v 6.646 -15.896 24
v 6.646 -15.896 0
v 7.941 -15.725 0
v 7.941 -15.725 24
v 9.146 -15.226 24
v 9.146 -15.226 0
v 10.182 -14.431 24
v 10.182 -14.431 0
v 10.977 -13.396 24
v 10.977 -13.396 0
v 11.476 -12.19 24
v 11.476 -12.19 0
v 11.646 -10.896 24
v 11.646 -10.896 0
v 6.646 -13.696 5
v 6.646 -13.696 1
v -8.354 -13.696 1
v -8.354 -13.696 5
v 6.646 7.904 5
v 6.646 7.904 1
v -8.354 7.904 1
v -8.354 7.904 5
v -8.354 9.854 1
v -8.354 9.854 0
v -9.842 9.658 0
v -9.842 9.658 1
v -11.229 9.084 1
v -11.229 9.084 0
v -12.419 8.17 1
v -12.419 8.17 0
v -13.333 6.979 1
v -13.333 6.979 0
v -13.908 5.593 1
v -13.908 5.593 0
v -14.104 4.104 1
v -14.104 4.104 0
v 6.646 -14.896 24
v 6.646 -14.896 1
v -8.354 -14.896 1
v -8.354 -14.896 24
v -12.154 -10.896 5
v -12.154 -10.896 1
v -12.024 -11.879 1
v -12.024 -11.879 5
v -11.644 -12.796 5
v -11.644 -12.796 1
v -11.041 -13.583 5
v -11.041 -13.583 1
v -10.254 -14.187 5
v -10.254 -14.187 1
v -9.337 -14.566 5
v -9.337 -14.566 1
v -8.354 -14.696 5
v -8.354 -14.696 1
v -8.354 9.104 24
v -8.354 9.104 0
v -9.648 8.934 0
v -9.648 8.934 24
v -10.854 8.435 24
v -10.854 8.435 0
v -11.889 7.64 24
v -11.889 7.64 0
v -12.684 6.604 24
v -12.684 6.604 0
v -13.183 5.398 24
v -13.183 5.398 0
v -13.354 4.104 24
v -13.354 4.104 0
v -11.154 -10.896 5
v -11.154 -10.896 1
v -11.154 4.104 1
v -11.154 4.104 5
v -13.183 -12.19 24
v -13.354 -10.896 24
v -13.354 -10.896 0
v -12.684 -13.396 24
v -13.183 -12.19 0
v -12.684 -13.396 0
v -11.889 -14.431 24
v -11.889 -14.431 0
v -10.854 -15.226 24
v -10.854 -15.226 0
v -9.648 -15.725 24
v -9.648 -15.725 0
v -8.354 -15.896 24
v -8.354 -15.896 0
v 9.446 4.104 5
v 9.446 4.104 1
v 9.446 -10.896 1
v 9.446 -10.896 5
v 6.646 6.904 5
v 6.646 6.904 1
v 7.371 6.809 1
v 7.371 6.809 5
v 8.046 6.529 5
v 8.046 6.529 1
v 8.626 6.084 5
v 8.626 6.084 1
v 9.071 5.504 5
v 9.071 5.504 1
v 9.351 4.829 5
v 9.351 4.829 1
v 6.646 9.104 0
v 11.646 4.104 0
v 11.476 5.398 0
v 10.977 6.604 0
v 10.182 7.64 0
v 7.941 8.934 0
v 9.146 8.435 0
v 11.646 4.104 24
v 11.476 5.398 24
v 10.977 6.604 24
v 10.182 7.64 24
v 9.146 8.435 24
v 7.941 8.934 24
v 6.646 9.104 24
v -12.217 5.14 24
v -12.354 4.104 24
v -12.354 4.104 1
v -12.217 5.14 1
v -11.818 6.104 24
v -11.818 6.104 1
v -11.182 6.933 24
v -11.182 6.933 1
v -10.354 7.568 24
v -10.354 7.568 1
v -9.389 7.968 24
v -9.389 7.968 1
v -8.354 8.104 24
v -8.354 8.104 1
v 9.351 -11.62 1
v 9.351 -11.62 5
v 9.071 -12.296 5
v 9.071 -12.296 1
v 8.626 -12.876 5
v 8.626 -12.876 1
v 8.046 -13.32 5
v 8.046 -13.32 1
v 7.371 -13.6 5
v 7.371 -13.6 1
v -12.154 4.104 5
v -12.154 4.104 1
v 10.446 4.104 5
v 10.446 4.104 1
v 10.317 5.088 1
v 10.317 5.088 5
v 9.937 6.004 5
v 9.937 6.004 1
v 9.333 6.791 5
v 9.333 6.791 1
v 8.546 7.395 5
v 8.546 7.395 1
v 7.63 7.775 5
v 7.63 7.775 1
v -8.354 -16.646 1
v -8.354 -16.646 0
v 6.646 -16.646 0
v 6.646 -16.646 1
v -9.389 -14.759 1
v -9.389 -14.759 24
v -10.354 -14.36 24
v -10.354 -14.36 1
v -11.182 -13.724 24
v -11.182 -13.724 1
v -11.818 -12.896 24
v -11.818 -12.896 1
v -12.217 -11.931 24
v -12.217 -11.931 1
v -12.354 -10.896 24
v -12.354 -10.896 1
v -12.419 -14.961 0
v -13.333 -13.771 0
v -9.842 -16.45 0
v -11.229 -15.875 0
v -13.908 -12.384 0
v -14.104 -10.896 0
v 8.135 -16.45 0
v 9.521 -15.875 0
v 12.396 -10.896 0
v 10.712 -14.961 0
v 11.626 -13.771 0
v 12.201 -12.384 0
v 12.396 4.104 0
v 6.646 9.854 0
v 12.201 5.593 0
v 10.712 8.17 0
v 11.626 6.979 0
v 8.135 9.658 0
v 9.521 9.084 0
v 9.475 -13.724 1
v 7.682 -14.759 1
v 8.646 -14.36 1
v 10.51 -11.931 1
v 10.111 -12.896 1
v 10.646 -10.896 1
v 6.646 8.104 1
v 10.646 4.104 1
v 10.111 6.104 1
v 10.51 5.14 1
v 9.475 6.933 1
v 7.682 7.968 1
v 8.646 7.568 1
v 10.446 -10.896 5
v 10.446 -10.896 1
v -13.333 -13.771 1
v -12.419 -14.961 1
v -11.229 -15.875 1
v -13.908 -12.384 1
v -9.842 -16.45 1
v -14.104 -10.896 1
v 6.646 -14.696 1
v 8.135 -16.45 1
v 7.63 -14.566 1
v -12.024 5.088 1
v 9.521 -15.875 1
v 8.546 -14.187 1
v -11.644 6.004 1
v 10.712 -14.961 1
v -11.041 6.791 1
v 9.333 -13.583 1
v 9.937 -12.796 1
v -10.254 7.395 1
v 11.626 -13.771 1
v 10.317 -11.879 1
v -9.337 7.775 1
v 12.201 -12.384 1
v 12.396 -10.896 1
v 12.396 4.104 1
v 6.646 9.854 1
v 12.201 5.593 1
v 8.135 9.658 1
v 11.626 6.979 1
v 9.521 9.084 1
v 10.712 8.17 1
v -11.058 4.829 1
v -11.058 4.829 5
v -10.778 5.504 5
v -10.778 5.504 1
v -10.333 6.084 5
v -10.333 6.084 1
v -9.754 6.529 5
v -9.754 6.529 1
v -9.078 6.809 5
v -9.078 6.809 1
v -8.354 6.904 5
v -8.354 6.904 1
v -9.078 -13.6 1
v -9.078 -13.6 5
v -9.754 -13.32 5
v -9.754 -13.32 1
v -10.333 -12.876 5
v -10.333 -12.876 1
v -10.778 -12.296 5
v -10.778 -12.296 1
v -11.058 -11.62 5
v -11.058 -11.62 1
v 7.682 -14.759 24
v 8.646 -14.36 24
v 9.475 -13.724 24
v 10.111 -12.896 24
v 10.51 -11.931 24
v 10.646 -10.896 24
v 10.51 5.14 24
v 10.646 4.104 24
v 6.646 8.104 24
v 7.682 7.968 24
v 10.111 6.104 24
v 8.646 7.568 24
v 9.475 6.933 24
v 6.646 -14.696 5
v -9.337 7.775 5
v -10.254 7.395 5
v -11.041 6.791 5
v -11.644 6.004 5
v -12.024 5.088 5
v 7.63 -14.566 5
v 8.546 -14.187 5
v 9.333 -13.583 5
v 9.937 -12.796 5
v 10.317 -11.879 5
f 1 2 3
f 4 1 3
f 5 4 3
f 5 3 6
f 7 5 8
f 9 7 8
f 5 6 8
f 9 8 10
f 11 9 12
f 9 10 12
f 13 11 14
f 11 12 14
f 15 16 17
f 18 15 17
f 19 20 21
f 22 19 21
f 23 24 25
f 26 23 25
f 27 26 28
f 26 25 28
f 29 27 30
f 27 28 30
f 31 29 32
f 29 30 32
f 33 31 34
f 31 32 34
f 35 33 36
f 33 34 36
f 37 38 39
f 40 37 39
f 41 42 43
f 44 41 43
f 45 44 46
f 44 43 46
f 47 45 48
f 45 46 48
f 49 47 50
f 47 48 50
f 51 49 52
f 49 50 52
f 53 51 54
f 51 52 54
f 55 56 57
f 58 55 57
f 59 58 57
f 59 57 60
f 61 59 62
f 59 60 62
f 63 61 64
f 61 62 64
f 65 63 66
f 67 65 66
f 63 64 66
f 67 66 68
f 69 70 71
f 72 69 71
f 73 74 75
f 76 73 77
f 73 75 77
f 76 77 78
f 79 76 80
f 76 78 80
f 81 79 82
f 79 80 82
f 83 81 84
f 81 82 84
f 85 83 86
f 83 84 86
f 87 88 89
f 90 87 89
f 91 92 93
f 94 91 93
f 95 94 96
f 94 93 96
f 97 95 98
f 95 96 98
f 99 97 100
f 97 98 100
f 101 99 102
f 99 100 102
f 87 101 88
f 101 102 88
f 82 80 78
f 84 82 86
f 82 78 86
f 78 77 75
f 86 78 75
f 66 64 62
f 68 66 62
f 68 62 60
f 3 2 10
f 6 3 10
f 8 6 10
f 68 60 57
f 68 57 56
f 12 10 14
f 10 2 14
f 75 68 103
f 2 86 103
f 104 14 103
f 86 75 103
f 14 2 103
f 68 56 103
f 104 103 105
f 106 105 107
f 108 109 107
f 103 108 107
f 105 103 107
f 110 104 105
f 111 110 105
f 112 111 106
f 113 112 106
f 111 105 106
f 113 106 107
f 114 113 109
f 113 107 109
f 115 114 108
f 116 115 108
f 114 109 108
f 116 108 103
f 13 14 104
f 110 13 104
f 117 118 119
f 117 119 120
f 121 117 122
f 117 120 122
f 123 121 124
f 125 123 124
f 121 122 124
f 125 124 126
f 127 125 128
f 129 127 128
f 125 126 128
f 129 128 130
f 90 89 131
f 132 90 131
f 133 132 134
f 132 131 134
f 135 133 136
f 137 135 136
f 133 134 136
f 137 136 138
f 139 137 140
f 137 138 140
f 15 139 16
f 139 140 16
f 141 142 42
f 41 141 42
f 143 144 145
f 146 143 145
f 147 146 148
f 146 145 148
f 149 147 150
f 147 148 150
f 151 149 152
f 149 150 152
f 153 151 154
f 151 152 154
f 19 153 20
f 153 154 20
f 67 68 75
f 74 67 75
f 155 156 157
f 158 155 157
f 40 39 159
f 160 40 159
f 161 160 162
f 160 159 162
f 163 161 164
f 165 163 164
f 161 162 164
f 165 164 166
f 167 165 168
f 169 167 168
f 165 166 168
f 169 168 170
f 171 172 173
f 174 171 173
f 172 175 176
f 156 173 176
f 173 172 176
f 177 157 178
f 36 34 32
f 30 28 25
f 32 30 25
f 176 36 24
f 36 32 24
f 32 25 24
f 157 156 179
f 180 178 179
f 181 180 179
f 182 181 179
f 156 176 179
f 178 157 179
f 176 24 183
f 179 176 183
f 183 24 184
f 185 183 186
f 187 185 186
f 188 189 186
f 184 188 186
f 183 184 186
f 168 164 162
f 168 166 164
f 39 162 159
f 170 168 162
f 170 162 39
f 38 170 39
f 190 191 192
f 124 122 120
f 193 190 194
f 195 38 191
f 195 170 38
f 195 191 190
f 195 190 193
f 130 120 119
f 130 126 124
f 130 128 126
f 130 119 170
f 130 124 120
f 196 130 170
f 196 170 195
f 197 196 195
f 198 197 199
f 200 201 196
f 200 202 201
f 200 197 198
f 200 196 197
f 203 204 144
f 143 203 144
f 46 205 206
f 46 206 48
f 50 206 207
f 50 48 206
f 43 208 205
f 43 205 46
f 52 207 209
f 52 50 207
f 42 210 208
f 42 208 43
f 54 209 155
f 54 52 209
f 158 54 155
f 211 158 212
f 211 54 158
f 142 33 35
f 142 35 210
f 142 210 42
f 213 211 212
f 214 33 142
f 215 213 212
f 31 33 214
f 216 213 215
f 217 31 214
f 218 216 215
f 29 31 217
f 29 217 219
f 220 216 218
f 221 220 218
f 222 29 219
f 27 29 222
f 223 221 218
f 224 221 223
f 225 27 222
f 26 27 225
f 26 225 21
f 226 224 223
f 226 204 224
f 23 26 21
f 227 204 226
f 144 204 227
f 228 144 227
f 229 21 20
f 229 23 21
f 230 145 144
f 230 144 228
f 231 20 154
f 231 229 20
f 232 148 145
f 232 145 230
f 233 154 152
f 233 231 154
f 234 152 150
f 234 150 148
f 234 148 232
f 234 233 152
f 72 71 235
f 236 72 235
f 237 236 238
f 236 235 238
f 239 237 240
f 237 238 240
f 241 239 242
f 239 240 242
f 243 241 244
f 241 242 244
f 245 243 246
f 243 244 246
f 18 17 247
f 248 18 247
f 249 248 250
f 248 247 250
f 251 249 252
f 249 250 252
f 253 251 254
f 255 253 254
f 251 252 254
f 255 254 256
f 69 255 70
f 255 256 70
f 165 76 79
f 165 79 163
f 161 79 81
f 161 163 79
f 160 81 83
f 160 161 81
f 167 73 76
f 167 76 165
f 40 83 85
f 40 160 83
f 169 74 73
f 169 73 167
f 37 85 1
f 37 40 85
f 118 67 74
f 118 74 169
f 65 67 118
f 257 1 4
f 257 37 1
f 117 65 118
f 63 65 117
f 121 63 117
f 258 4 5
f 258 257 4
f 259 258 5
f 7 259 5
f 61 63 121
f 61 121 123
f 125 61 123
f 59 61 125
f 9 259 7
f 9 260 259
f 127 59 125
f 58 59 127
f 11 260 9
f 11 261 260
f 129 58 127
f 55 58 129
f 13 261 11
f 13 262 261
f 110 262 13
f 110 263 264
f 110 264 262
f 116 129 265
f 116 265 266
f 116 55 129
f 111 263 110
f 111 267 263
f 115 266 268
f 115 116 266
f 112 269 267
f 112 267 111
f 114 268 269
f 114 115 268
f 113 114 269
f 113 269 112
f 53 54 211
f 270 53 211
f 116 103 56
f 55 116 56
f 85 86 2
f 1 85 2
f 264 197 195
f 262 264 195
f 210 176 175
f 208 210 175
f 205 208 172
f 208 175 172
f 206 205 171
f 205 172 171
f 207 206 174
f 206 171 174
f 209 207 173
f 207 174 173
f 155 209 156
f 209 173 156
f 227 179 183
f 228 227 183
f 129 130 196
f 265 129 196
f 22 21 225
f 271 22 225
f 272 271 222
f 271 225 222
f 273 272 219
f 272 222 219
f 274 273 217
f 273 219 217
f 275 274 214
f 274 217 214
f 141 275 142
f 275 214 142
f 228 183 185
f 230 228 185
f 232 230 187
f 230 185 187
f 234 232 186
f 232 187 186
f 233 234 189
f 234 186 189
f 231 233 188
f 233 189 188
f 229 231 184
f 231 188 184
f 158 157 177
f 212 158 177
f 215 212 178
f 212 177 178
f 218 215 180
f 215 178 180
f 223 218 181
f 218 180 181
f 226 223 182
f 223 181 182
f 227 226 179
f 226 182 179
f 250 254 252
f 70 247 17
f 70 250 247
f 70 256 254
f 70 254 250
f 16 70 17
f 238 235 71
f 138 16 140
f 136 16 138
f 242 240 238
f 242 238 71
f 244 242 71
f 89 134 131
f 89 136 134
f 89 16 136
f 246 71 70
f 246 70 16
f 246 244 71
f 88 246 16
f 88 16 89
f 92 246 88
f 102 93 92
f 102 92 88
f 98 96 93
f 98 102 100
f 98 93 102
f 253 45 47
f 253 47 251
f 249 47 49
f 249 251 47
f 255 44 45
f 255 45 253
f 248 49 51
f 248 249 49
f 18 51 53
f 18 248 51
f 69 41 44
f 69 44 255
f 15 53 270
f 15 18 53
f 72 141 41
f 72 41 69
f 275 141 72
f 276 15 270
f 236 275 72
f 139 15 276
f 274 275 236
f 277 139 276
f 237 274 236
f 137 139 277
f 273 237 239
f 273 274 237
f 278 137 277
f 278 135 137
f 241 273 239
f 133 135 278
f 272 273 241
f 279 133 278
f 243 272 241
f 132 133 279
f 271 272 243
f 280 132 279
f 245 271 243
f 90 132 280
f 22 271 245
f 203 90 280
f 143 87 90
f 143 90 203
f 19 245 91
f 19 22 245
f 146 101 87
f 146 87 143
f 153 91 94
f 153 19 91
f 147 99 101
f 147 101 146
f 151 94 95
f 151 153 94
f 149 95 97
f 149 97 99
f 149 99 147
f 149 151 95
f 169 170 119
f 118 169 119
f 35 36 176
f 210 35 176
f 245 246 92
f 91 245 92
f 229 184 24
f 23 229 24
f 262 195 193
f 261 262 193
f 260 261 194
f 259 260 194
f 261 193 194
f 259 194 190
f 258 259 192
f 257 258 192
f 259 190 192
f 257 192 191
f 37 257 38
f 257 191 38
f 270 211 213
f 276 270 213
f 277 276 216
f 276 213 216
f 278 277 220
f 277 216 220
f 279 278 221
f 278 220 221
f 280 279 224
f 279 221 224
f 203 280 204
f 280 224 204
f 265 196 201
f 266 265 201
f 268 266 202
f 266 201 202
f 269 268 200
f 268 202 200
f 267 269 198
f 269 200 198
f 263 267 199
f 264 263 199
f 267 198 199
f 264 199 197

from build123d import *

# Parameters (mm, degrees)
F4_DEPTH = 1
F5_DEPTH = 24
F6_DEPTH = 1
F7_DEPTH = 5


with BuildPart() as f4:
    # F3 (on Top) → F4 (new body)
    with BuildSketch(Plane.XY):
        with BuildLine():
            Line((6.6464926861, 9.10439419), (-8.3535073139, 9.10439419))
            ThreePointArc((-8.3535073139, 9.10439419), (-11.8890412198, 7.6399280959), (-13.3535073139, 4.10439419))
            Line((-13.3535073139, 4.10439419), (-13.3535073139, -10.89560581))
            ThreePointArc((-13.3535073139, -10.89560581), (-11.8890412198, -14.4311397159), (-8.3535073139, -15.89560581))
            Line((-8.3535073139, -15.89560581), (6.6464926861, -15.89560581))
            ThreePointArc((6.6464926861, -15.89560581), (10.1820265921, -14.4311397159), (11.6464926861, -10.89560581))
            Line((11.6464926861, -10.89560581), (11.6464926861, 4.10439419))
            ThreePointArc((11.6464926861, 4.10439419), (10.1820265921, 7.6399280959), (6.6464926861, 9.10439419))
        make_face()
        with BuildLine():
            ThreePointArc((-12.3535073139, 4.10439419), (-11.1819344386, 6.9328213148), (-8.3535073139, 8.10439419))
            Line((-8.3535073139, 8.10439419), (6.6464926861, 8.10439419))
            ThreePointArc((6.6464926861, 8.10439419), (9.4749198109, 6.9328213148), (10.6464926861, 4.10439419))
            Line((10.6464926861, 4.10439419), (10.6464926861, -10.89560581))
            ThreePointArc((10.6464926861, -10.89560581), (9.4749198109, -13.7240329347), (6.6464926861, -14.89560581))
            Line((6.6464926861, -14.89560581), (-8.3535073139, -14.89560581))
            ThreePointArc((-8.3535073139, -14.89560581), (-11.1819344386, -13.7240329347), (-12.3535073139, -10.89560581))
            Line((-12.3535073139, -10.89560581), (-12.3535073139, 4.10439419))
        make_face(mode=Mode.SUBTRACT)
        with BuildLine():
            Line((6.6464926861, 8.10439419), (-8.3535073139, 8.10439419))
            ThreePointArc((-8.3535073139, 8.10439419), (-11.1819344386, 6.9328213148), (-12.3535073139, 4.10439419))
            Line((-12.3535073139, 4.10439419), (-12.3535073139, -10.89560581))
            ThreePointArc((-12.3535073139, -10.89560581), (-11.1819344386, -13.7240329347), (-8.3535073139, -14.89560581))
            Line((-8.3535073139, -14.89560581), (6.6464926861, -14.89560581))
            ThreePointArc((6.6464926861, -14.89560581), (9.4749198109, -13.7240329347), (10.6464926861, -10.89560581))
            Line((10.6464926861, -10.89560581), (10.6464926861, 4.10439419))
            ThreePointArc((10.6464926861, 4.10439419), (9.4749198109, 6.9328213148), (6.6464926861, 8.10439419))
        make_face()
        with BuildLine():
            ThreePointArc((-12.1535073139, 4.10439419), (-11.0405130824, 6.7913999585), (-8.3535073139, 7.90439419))
            Line((-8.3535073139, 7.90439419), (6.6464926861, 7.90439419))
            ThreePointArc((6.6464926861, 7.90439419), (9.3334984546, 6.7913999585), (10.4464926861, 4.10439419))
            Line((10.4464926861, 4.10439419), (10.4464926861, -10.89560581))
            ThreePointArc((10.4464926861, -10.89560581), (9.3334984546, -13.5826115785), (6.6464926861, -14.69560581))
            Line((6.6464926861, -14.69560581), (-8.3535073139, -14.69560581))
            ThreePointArc((-8.3535073139, -14.69560581), (-11.0405130824, -13.5826115785), (-12.1535073139, -10.89560581))
            Line((-12.1535073139, -10.89560581), (-12.1535073139, 4.10439419))
        make_face(mode=Mode.SUBTRACT)
        with BuildLine():
            Line((6.6464926861, 7.90439419), (-8.3535073139, 7.90439419))
            ThreePointArc((-8.3535073139, 7.90439419), (-11.0405130824, 6.7913999585), (-12.1535073139, 4.10439419))
            Line((-12.1535073139, 4.10439419), (-12.1535073139, -10.89560581))
            ThreePointArc((-12.1535073139, -10.89560581), (-11.0405130824, -13.5826115785), (-8.3535073139, -14.69560581))
            Line((-8.3535073139, -14.69560581), (6.6464926861, -14.69560581))
            ThreePointArc((6.6464926861, -14.69560581), (9.3334984546, -13.5826115785), (10.4464926861, -10.89560581))
            Line((10.4464926861, -10.89560581), (10.4464926861, 4.10439419))
            ThreePointArc((10.4464926861, 4.10439419), (9.3334984546, 6.7913999585), (6.6464926861, 7.90439419))
        make_face()
        with BuildLine():
            ThreePointArc((-11.1535073139, 4.10439419), (-10.3334063012, 6.0842931773), (-8.3535073139, 6.90439419))
            Line((-8.3535073139, 6.90439419), (6.6464926861, 6.90439419))
            ThreePointArc((6.6464926861, 6.90439419), (8.6263916734, 6.0842931773), (9.4464926861, 4.10439419))
            Line((9.4464926861, 4.10439419), (9.4464926861, -10.89560581))
            ThreePointArc((9.4464926861, -10.89560581), (8.6263916734, -12.8755047973), (6.6464926861, -13.69560581))
            Line((6.6464926861, -13.69560581), (-8.3535073139, -13.69560581))
            ThreePointArc((-8.3535073139, -13.69560581), (-10.3334063012, -12.8755047973), (-11.1535073139, -10.89560581))
            Line((-11.1535073139, -10.89560581), (-11.1535073139, 4.10439419))
        make_face(mode=Mode.SUBTRACT)
        with BuildLine():
            Line((6.6464926861, 6.90439419), (-8.3535073139, 6.90439419))
            ThreePointArc((-8.3535073139, 6.90439419), (-10.3334063012, 6.0842931773), (-11.1535073139, 4.10439419))
            Line((-11.1535073139, 4.10439419), (-11.1535073139, -10.89560581))
            ThreePointArc((-11.1535073139, -10.89560581), (-10.3334063012, -12.8755047973), (-8.3535073139, -13.69560581))
            Line((-8.3535073139, -13.69560581), (6.6464926861, -13.69560581))
            ThreePointArc((6.6464926861, -13.69560581), (8.6263916734, -12.8755047973), (9.4464926861, -10.89560581))
            Line((9.4464926861, -10.89560581), (9.4464926861, 4.10439419))
            ThreePointArc((9.4464926861, 4.10439419), (8.6263916734, 6.0842931773), (6.6464926861, 6.90439419))
        make_face()
    extrude(amount=F4_DEPTH)

    # F3 (on Top) → F5 (join)
    with BuildSketch(Plane.XY):
        with BuildLine():
            Line((6.6464926861, 9.10439419), (-8.3535073139, 9.10439419))
            ThreePointArc((-8.3535073139, 9.10439419), (-11.8890412198, 7.6399280959), (-13.3535073139, 4.10439419))
            Line((-13.3535073139, 4.10439419), (-13.3535073139, -10.89560581))
            ThreePointArc((-13.3535073139, -10.89560581), (-11.8890412198, -14.4311397159), (-8.3535073139, -15.89560581))
            Line((-8.3535073139, -15.89560581), (6.6464926861, -15.89560581))
            ThreePointArc((6.6464926861, -15.89560581), (10.1820265921, -14.4311397159), (11.6464926861, -10.89560581))
            Line((11.6464926861, -10.89560581), (11.6464926861, 4.10439419))
            ThreePointArc((11.6464926861, 4.10439419), (10.1820265921, 7.6399280959), (6.6464926861, 9.10439419))
        make_face()
        with BuildLine():
            ThreePointArc((-12.3535073139, 4.10439419), (-11.1819344386, 6.9328213148), (-8.3535073139, 8.10439419))
            Line((-8.3535073139, 8.10439419), (6.6464926861, 8.10439419))
            ThreePointArc((6.6464926861, 8.10439419), (9.4749198109, 6.9328213148), (10.6464926861, 4.10439419))
            Line((10.6464926861, 4.10439419), (10.6464926861, -10.89560581))
            ThreePointArc((10.6464926861, -10.89560581), (9.4749198109, -13.7240329347), (6.6464926861, -14.89560581))
            Line((6.6464926861, -14.89560581), (-8.3535073139, -14.89560581))
            ThreePointArc((-8.3535073139, -14.89560581), (-11.1819344386, -13.7240329347), (-12.3535073139, -10.89560581))
            Line((-12.3535073139, -10.89560581), (-12.3535073139, 4.10439419))
        make_face(mode=Mode.SUBTRACT)
    extrude(amount=F5_DEPTH)


with BuildPart() as f6:
    # F3 (on Top) → F6 (new body)
    with BuildSketch(Plane.XY):
        with BuildLine():
            Line((6.6464926861, 9.85439419), (-8.3535073139, 9.85439419))
            ThreePointArc((-8.3535073139, 9.85439419), (-12.4193713057, 8.1702581818), (-14.1035073139, 4.10439419))
            Line((-14.1035073139, 4.10439419), (-14.1035073139, -10.89560581))
            ThreePointArc((-14.1035073139, -10.89560581), (-12.4193713057, -14.9614698018), (-8.3535073139, -16.64560581))
            Line((-8.3535073139, -16.64560581), (6.6464926861, -16.64560581))
            ThreePointArc((6.6464926861, -16.64560581), (10.7123566779, -14.9614698018), (12.3964926861, -10.89560581))
            Line((12.3964926861, -10.89560581), (12.3964926861, 4.10439419))
            ThreePointArc((12.3964926861, 4.10439419), (10.7123566779, 8.1702581818), (6.6464926861, 9.85439419))
        make_face()
        with BuildLine():
            ThreePointArc((-13.3535073139, 4.10439419), (-11.8890412198, 7.6399280959), (-8.3535073139, 9.10439419))
            Line((-8.3535073139, 9.10439419), (6.6464926861, 9.10439419))
            ThreePointArc((6.6464926861, 9.10439419), (10.1820265921, 7.6399280959), (11.6464926861, 4.10439419))
            Line((11.6464926861, 4.10439419), (11.6464926861, -10.89560581))
            ThreePointArc((11.6464926861, -10.89560581), (10.1820265921, -14.4311397159), (6.6464926861, -15.89560581))
            Line((6.6464926861, -15.89560581), (-8.3535073139, -15.89560581))
            ThreePointArc((-8.3535073139, -15.89560581), (-11.8890412198, -14.4311397159), (-13.3535073139, -10.89560581))
            Line((-13.3535073139, -10.89560581), (-13.3535073139, 4.10439419))
        make_face(mode=Mode.SUBTRACT)
        with BuildLine():
            Line((6.6464926861, 9.10439419), (-8.3535073139, 9.10439419))
            ThreePointArc((-8.3535073139, 9.10439419), (-11.8890412198, 7.6399280959), (-13.3535073139, 4.10439419))
            Line((-13.3535073139, 4.10439419), (-13.3535073139, -10.89560581))
            ThreePointArc((-13.3535073139, -10.89560581), (-11.8890412198, -14.4311397159), (-8.3535073139, -15.89560581))
            Line((-8.3535073139, -15.89560581), (6.6464926861, -15.89560581))
            ThreePointArc((6.6464926861, -15.89560581), (10.1820265921, -14.4311397159), (11.6464926861, -10.89560581))
            Line((11.6464926861, -10.89560581), (11.6464926861, 4.10439419))
            ThreePointArc((11.6464926861, 4.10439419), (10.1820265921, 7.6399280959), (6.6464926861, 9.10439419))
        make_face()
        with BuildLine():
            ThreePointArc((-12.3535073139, 4.10439419), (-11.1819344386, 6.9328213148), (-8.3535073139, 8.10439419))
            Line((-8.3535073139, 8.10439419), (6.6464926861, 8.10439419))
            ThreePointArc((6.6464926861, 8.10439419), (9.4749198109, 6.9328213148), (10.6464926861, 4.10439419))
            Line((10.6464926861, 4.10439419), (10.6464926861, -10.89560581))
            ThreePointArc((10.6464926861, -10.89560581), (9.4749198109, -13.7240329347), (6.6464926861, -14.89560581))
            Line((6.6464926861, -14.89560581), (-8.3535073139, -14.89560581))
            ThreePointArc((-8.3535073139, -14.89560581), (-11.1819344386, -13.7240329347), (-12.3535073139, -10.89560581))
            Line((-12.3535073139, -10.89560581), (-12.3535073139, 4.10439419))
        make_face(mode=Mode.SUBTRACT)
        with BuildLine():
            Line((6.6464926861, 8.10439419), (-8.3535073139, 8.10439419))
            ThreePointArc((-8.3535073139, 8.10439419), (-11.1819344386, 6.9328213148), (-12.3535073139, 4.10439419))
            Line((-12.3535073139, 4.10439419), (-12.3535073139, -10.89560581))
            ThreePointArc((-12.3535073139, -10.89560581), (-11.1819344386, -13.7240329347), (-8.3535073139, -14.89560581))
            Line((-8.3535073139, -14.89560581), (6.6464926861, -14.89560581))
            ThreePointArc((6.6464926861, -14.89560581), (9.4749198109, -13.7240329347), (10.6464926861, -10.89560581))
            Line((10.6464926861, -10.89560581), (10.6464926861, 4.10439419))
            ThreePointArc((10.6464926861, 4.10439419), (9.4749198109, 6.9328213148), (6.6464926861, 8.10439419))
        make_face()
        with BuildLine():
            ThreePointArc((-12.1535073139, 4.10439419), (-11.0405130824, 6.7913999585), (-8.3535073139, 7.90439419))
            Line((-8.3535073139, 7.90439419), (6.6464926861, 7.90439419))
            ThreePointArc((6.6464926861, 7.90439419), (9.3334984546, 6.7913999585), (10.4464926861, 4.10439419))
            Line((10.4464926861, 4.10439419), (10.4464926861, -10.89560581))
            ThreePointArc((10.4464926861, -10.89560581), (9.3334984546, -13.5826115785), (6.6464926861, -14.69560581))
            Line((6.6464926861, -14.69560581), (-8.3535073139, -14.69560581))
            ThreePointArc((-8.3535073139, -14.69560581), (-11.0405130824, -13.5826115785), (-12.1535073139, -10.89560581))
            Line((-12.1535073139, -10.89560581), (-12.1535073139, 4.10439419))
        make_face(mode=Mode.SUBTRACT)
        with BuildLine():
            Line((6.6464926861, 7.90439419), (-8.3535073139, 7.90439419))
            ThreePointArc((-8.3535073139, 7.90439419), (-11.0405130824, 6.7913999585), (-12.1535073139, 4.10439419))
            Line((-12.1535073139, 4.10439419), (-12.1535073139, -10.89560581))
            ThreePointArc((-12.1535073139, -10.89560581), (-11.0405130824, -13.5826115785), (-8.3535073139, -14.69560581))
            Line((-8.3535073139, -14.69560581), (6.6464926861, -14.69560581))
            ThreePointArc((6.6464926861, -14.69560581), (9.3334984546, -13.5826115785), (10.4464926861, -10.89560581))
            Line((10.4464926861, -10.89560581), (10.4464926861, 4.10439419))
            ThreePointArc((10.4464926861, 4.10439419), (9.3334984546, 6.7913999585), (6.6464926861, 7.90439419))
        make_face()
        with BuildLine():
            ThreePointArc((-11.1535073139, 4.10439419), (-10.3334063012, 6.0842931773), (-8.3535073139, 6.90439419))
            Line((-8.3535073139, 6.90439419), (6.6464926861, 6.90439419))
            ThreePointArc((6.6464926861, 6.90439419), (8.6263916734, 6.0842931773), (9.4464926861, 4.10439419))
            Line((9.4464926861, 4.10439419), (9.4464926861, -10.89560581))
            ThreePointArc((9.4464926861, -10.89560581), (8.6263916734, -12.8755047973), (6.6464926861, -13.69560581))
            Line((6.6464926861, -13.69560581), (-8.3535073139, -13.69560581))
            ThreePointArc((-8.3535073139, -13.69560581), (-10.3334063012, -12.8755047973), (-11.1535073139, -10.89560581))
            Line((-11.1535073139, -10.89560581), (-11.1535073139, 4.10439419))
        make_face(mode=Mode.SUBTRACT)
        with BuildLine():
            Line((6.6464926861, 6.90439419), (-8.3535073139, 6.90439419))
            ThreePointArc((-8.3535073139, 6.90439419), (-10.3334063012, 6.0842931773), (-11.1535073139, 4.10439419))
            Line((-11.1535073139, 4.10439419), (-11.1535073139, -10.89560581))
            ThreePointArc((-11.1535073139, -10.89560581), (-10.3334063012, -12.8755047973), (-8.3535073139, -13.69560581))
            Line((-8.3535073139, -13.69560581), (6.6464926861, -13.69560581))
            ThreePointArc((6.6464926861, -13.69560581), (8.6263916734, -12.8755047973), (9.4464926861, -10.89560581))
            Line((9.4464926861, -10.89560581), (9.4464926861, 4.10439419))
            ThreePointArc((9.4464926861, 4.10439419), (8.6263916734, 6.0842931773), (6.6464926861, 6.90439419))
        make_face()
    extrude(amount=F6_DEPTH)

    # F3 (on Top) → F7 (join)
    with BuildSketch(Plane.XY):
        with BuildLine():
            Line((6.6464926861, 7.90439419), (-8.3535073139, 7.90439419))
            ThreePointArc((-8.3535073139, 7.90439419), (-11.0405130824, 6.7913999585), (-12.1535073139, 4.10439419))
            Line((-12.1535073139, 4.10439419), (-12.1535073139, -10.89560581))
            ThreePointArc((-12.1535073139, -10.89560581), (-11.0405130824, -13.5826115785), (-8.3535073139, -14.69560581))
            Line((-8.3535073139, -14.69560581), (6.6464926861, -14.69560581))
            ThreePointArc((6.6464926861, -14.69560581), (9.3334984546, -13.5826115785), (10.4464926861, -10.89560581))
            Line((10.4464926861, -10.89560581), (10.4464926861, 4.10439419))
            ThreePointArc((10.4464926861, 4.10439419), (9.3334984546, 6.7913999585), (6.6464926861, 7.90439419))
        make_face()
        with BuildLine():
            ThreePointArc((-11.1535073139, 4.10439419), (-10.3334063012, 6.0842931773), (-8.3535073139, 6.90439419))
            Line((-8.3535073139, 6.90439419), (6.6464926861, 6.90439419))
            ThreePointArc((6.6464926861, 6.90439419), (8.6263916734, 6.0842931773), (9.4464926861, 4.10439419))
            Line((9.4464926861, 4.10439419), (9.4464926861, -10.89560581))
            ThreePointArc((9.4464926861, -10.89560581), (8.6263916734, -12.8755047973), (6.6464926861, -13.69560581))
            Line((6.6464926861, -13.69560581), (-8.3535073139, -13.69560581))
            ThreePointArc((-8.3535073139, -13.69560581), (-10.3334063012, -12.8755047973), (-11.1535073139, -10.89560581))
            Line((-11.1535073139, -10.89560581), (-11.1535073139, 4.10439419))
        make_face(mode=Mode.SUBTRACT)
    extrude(amount=F7_DEPTH)


solid = Compound([f4.part, f6.part])
